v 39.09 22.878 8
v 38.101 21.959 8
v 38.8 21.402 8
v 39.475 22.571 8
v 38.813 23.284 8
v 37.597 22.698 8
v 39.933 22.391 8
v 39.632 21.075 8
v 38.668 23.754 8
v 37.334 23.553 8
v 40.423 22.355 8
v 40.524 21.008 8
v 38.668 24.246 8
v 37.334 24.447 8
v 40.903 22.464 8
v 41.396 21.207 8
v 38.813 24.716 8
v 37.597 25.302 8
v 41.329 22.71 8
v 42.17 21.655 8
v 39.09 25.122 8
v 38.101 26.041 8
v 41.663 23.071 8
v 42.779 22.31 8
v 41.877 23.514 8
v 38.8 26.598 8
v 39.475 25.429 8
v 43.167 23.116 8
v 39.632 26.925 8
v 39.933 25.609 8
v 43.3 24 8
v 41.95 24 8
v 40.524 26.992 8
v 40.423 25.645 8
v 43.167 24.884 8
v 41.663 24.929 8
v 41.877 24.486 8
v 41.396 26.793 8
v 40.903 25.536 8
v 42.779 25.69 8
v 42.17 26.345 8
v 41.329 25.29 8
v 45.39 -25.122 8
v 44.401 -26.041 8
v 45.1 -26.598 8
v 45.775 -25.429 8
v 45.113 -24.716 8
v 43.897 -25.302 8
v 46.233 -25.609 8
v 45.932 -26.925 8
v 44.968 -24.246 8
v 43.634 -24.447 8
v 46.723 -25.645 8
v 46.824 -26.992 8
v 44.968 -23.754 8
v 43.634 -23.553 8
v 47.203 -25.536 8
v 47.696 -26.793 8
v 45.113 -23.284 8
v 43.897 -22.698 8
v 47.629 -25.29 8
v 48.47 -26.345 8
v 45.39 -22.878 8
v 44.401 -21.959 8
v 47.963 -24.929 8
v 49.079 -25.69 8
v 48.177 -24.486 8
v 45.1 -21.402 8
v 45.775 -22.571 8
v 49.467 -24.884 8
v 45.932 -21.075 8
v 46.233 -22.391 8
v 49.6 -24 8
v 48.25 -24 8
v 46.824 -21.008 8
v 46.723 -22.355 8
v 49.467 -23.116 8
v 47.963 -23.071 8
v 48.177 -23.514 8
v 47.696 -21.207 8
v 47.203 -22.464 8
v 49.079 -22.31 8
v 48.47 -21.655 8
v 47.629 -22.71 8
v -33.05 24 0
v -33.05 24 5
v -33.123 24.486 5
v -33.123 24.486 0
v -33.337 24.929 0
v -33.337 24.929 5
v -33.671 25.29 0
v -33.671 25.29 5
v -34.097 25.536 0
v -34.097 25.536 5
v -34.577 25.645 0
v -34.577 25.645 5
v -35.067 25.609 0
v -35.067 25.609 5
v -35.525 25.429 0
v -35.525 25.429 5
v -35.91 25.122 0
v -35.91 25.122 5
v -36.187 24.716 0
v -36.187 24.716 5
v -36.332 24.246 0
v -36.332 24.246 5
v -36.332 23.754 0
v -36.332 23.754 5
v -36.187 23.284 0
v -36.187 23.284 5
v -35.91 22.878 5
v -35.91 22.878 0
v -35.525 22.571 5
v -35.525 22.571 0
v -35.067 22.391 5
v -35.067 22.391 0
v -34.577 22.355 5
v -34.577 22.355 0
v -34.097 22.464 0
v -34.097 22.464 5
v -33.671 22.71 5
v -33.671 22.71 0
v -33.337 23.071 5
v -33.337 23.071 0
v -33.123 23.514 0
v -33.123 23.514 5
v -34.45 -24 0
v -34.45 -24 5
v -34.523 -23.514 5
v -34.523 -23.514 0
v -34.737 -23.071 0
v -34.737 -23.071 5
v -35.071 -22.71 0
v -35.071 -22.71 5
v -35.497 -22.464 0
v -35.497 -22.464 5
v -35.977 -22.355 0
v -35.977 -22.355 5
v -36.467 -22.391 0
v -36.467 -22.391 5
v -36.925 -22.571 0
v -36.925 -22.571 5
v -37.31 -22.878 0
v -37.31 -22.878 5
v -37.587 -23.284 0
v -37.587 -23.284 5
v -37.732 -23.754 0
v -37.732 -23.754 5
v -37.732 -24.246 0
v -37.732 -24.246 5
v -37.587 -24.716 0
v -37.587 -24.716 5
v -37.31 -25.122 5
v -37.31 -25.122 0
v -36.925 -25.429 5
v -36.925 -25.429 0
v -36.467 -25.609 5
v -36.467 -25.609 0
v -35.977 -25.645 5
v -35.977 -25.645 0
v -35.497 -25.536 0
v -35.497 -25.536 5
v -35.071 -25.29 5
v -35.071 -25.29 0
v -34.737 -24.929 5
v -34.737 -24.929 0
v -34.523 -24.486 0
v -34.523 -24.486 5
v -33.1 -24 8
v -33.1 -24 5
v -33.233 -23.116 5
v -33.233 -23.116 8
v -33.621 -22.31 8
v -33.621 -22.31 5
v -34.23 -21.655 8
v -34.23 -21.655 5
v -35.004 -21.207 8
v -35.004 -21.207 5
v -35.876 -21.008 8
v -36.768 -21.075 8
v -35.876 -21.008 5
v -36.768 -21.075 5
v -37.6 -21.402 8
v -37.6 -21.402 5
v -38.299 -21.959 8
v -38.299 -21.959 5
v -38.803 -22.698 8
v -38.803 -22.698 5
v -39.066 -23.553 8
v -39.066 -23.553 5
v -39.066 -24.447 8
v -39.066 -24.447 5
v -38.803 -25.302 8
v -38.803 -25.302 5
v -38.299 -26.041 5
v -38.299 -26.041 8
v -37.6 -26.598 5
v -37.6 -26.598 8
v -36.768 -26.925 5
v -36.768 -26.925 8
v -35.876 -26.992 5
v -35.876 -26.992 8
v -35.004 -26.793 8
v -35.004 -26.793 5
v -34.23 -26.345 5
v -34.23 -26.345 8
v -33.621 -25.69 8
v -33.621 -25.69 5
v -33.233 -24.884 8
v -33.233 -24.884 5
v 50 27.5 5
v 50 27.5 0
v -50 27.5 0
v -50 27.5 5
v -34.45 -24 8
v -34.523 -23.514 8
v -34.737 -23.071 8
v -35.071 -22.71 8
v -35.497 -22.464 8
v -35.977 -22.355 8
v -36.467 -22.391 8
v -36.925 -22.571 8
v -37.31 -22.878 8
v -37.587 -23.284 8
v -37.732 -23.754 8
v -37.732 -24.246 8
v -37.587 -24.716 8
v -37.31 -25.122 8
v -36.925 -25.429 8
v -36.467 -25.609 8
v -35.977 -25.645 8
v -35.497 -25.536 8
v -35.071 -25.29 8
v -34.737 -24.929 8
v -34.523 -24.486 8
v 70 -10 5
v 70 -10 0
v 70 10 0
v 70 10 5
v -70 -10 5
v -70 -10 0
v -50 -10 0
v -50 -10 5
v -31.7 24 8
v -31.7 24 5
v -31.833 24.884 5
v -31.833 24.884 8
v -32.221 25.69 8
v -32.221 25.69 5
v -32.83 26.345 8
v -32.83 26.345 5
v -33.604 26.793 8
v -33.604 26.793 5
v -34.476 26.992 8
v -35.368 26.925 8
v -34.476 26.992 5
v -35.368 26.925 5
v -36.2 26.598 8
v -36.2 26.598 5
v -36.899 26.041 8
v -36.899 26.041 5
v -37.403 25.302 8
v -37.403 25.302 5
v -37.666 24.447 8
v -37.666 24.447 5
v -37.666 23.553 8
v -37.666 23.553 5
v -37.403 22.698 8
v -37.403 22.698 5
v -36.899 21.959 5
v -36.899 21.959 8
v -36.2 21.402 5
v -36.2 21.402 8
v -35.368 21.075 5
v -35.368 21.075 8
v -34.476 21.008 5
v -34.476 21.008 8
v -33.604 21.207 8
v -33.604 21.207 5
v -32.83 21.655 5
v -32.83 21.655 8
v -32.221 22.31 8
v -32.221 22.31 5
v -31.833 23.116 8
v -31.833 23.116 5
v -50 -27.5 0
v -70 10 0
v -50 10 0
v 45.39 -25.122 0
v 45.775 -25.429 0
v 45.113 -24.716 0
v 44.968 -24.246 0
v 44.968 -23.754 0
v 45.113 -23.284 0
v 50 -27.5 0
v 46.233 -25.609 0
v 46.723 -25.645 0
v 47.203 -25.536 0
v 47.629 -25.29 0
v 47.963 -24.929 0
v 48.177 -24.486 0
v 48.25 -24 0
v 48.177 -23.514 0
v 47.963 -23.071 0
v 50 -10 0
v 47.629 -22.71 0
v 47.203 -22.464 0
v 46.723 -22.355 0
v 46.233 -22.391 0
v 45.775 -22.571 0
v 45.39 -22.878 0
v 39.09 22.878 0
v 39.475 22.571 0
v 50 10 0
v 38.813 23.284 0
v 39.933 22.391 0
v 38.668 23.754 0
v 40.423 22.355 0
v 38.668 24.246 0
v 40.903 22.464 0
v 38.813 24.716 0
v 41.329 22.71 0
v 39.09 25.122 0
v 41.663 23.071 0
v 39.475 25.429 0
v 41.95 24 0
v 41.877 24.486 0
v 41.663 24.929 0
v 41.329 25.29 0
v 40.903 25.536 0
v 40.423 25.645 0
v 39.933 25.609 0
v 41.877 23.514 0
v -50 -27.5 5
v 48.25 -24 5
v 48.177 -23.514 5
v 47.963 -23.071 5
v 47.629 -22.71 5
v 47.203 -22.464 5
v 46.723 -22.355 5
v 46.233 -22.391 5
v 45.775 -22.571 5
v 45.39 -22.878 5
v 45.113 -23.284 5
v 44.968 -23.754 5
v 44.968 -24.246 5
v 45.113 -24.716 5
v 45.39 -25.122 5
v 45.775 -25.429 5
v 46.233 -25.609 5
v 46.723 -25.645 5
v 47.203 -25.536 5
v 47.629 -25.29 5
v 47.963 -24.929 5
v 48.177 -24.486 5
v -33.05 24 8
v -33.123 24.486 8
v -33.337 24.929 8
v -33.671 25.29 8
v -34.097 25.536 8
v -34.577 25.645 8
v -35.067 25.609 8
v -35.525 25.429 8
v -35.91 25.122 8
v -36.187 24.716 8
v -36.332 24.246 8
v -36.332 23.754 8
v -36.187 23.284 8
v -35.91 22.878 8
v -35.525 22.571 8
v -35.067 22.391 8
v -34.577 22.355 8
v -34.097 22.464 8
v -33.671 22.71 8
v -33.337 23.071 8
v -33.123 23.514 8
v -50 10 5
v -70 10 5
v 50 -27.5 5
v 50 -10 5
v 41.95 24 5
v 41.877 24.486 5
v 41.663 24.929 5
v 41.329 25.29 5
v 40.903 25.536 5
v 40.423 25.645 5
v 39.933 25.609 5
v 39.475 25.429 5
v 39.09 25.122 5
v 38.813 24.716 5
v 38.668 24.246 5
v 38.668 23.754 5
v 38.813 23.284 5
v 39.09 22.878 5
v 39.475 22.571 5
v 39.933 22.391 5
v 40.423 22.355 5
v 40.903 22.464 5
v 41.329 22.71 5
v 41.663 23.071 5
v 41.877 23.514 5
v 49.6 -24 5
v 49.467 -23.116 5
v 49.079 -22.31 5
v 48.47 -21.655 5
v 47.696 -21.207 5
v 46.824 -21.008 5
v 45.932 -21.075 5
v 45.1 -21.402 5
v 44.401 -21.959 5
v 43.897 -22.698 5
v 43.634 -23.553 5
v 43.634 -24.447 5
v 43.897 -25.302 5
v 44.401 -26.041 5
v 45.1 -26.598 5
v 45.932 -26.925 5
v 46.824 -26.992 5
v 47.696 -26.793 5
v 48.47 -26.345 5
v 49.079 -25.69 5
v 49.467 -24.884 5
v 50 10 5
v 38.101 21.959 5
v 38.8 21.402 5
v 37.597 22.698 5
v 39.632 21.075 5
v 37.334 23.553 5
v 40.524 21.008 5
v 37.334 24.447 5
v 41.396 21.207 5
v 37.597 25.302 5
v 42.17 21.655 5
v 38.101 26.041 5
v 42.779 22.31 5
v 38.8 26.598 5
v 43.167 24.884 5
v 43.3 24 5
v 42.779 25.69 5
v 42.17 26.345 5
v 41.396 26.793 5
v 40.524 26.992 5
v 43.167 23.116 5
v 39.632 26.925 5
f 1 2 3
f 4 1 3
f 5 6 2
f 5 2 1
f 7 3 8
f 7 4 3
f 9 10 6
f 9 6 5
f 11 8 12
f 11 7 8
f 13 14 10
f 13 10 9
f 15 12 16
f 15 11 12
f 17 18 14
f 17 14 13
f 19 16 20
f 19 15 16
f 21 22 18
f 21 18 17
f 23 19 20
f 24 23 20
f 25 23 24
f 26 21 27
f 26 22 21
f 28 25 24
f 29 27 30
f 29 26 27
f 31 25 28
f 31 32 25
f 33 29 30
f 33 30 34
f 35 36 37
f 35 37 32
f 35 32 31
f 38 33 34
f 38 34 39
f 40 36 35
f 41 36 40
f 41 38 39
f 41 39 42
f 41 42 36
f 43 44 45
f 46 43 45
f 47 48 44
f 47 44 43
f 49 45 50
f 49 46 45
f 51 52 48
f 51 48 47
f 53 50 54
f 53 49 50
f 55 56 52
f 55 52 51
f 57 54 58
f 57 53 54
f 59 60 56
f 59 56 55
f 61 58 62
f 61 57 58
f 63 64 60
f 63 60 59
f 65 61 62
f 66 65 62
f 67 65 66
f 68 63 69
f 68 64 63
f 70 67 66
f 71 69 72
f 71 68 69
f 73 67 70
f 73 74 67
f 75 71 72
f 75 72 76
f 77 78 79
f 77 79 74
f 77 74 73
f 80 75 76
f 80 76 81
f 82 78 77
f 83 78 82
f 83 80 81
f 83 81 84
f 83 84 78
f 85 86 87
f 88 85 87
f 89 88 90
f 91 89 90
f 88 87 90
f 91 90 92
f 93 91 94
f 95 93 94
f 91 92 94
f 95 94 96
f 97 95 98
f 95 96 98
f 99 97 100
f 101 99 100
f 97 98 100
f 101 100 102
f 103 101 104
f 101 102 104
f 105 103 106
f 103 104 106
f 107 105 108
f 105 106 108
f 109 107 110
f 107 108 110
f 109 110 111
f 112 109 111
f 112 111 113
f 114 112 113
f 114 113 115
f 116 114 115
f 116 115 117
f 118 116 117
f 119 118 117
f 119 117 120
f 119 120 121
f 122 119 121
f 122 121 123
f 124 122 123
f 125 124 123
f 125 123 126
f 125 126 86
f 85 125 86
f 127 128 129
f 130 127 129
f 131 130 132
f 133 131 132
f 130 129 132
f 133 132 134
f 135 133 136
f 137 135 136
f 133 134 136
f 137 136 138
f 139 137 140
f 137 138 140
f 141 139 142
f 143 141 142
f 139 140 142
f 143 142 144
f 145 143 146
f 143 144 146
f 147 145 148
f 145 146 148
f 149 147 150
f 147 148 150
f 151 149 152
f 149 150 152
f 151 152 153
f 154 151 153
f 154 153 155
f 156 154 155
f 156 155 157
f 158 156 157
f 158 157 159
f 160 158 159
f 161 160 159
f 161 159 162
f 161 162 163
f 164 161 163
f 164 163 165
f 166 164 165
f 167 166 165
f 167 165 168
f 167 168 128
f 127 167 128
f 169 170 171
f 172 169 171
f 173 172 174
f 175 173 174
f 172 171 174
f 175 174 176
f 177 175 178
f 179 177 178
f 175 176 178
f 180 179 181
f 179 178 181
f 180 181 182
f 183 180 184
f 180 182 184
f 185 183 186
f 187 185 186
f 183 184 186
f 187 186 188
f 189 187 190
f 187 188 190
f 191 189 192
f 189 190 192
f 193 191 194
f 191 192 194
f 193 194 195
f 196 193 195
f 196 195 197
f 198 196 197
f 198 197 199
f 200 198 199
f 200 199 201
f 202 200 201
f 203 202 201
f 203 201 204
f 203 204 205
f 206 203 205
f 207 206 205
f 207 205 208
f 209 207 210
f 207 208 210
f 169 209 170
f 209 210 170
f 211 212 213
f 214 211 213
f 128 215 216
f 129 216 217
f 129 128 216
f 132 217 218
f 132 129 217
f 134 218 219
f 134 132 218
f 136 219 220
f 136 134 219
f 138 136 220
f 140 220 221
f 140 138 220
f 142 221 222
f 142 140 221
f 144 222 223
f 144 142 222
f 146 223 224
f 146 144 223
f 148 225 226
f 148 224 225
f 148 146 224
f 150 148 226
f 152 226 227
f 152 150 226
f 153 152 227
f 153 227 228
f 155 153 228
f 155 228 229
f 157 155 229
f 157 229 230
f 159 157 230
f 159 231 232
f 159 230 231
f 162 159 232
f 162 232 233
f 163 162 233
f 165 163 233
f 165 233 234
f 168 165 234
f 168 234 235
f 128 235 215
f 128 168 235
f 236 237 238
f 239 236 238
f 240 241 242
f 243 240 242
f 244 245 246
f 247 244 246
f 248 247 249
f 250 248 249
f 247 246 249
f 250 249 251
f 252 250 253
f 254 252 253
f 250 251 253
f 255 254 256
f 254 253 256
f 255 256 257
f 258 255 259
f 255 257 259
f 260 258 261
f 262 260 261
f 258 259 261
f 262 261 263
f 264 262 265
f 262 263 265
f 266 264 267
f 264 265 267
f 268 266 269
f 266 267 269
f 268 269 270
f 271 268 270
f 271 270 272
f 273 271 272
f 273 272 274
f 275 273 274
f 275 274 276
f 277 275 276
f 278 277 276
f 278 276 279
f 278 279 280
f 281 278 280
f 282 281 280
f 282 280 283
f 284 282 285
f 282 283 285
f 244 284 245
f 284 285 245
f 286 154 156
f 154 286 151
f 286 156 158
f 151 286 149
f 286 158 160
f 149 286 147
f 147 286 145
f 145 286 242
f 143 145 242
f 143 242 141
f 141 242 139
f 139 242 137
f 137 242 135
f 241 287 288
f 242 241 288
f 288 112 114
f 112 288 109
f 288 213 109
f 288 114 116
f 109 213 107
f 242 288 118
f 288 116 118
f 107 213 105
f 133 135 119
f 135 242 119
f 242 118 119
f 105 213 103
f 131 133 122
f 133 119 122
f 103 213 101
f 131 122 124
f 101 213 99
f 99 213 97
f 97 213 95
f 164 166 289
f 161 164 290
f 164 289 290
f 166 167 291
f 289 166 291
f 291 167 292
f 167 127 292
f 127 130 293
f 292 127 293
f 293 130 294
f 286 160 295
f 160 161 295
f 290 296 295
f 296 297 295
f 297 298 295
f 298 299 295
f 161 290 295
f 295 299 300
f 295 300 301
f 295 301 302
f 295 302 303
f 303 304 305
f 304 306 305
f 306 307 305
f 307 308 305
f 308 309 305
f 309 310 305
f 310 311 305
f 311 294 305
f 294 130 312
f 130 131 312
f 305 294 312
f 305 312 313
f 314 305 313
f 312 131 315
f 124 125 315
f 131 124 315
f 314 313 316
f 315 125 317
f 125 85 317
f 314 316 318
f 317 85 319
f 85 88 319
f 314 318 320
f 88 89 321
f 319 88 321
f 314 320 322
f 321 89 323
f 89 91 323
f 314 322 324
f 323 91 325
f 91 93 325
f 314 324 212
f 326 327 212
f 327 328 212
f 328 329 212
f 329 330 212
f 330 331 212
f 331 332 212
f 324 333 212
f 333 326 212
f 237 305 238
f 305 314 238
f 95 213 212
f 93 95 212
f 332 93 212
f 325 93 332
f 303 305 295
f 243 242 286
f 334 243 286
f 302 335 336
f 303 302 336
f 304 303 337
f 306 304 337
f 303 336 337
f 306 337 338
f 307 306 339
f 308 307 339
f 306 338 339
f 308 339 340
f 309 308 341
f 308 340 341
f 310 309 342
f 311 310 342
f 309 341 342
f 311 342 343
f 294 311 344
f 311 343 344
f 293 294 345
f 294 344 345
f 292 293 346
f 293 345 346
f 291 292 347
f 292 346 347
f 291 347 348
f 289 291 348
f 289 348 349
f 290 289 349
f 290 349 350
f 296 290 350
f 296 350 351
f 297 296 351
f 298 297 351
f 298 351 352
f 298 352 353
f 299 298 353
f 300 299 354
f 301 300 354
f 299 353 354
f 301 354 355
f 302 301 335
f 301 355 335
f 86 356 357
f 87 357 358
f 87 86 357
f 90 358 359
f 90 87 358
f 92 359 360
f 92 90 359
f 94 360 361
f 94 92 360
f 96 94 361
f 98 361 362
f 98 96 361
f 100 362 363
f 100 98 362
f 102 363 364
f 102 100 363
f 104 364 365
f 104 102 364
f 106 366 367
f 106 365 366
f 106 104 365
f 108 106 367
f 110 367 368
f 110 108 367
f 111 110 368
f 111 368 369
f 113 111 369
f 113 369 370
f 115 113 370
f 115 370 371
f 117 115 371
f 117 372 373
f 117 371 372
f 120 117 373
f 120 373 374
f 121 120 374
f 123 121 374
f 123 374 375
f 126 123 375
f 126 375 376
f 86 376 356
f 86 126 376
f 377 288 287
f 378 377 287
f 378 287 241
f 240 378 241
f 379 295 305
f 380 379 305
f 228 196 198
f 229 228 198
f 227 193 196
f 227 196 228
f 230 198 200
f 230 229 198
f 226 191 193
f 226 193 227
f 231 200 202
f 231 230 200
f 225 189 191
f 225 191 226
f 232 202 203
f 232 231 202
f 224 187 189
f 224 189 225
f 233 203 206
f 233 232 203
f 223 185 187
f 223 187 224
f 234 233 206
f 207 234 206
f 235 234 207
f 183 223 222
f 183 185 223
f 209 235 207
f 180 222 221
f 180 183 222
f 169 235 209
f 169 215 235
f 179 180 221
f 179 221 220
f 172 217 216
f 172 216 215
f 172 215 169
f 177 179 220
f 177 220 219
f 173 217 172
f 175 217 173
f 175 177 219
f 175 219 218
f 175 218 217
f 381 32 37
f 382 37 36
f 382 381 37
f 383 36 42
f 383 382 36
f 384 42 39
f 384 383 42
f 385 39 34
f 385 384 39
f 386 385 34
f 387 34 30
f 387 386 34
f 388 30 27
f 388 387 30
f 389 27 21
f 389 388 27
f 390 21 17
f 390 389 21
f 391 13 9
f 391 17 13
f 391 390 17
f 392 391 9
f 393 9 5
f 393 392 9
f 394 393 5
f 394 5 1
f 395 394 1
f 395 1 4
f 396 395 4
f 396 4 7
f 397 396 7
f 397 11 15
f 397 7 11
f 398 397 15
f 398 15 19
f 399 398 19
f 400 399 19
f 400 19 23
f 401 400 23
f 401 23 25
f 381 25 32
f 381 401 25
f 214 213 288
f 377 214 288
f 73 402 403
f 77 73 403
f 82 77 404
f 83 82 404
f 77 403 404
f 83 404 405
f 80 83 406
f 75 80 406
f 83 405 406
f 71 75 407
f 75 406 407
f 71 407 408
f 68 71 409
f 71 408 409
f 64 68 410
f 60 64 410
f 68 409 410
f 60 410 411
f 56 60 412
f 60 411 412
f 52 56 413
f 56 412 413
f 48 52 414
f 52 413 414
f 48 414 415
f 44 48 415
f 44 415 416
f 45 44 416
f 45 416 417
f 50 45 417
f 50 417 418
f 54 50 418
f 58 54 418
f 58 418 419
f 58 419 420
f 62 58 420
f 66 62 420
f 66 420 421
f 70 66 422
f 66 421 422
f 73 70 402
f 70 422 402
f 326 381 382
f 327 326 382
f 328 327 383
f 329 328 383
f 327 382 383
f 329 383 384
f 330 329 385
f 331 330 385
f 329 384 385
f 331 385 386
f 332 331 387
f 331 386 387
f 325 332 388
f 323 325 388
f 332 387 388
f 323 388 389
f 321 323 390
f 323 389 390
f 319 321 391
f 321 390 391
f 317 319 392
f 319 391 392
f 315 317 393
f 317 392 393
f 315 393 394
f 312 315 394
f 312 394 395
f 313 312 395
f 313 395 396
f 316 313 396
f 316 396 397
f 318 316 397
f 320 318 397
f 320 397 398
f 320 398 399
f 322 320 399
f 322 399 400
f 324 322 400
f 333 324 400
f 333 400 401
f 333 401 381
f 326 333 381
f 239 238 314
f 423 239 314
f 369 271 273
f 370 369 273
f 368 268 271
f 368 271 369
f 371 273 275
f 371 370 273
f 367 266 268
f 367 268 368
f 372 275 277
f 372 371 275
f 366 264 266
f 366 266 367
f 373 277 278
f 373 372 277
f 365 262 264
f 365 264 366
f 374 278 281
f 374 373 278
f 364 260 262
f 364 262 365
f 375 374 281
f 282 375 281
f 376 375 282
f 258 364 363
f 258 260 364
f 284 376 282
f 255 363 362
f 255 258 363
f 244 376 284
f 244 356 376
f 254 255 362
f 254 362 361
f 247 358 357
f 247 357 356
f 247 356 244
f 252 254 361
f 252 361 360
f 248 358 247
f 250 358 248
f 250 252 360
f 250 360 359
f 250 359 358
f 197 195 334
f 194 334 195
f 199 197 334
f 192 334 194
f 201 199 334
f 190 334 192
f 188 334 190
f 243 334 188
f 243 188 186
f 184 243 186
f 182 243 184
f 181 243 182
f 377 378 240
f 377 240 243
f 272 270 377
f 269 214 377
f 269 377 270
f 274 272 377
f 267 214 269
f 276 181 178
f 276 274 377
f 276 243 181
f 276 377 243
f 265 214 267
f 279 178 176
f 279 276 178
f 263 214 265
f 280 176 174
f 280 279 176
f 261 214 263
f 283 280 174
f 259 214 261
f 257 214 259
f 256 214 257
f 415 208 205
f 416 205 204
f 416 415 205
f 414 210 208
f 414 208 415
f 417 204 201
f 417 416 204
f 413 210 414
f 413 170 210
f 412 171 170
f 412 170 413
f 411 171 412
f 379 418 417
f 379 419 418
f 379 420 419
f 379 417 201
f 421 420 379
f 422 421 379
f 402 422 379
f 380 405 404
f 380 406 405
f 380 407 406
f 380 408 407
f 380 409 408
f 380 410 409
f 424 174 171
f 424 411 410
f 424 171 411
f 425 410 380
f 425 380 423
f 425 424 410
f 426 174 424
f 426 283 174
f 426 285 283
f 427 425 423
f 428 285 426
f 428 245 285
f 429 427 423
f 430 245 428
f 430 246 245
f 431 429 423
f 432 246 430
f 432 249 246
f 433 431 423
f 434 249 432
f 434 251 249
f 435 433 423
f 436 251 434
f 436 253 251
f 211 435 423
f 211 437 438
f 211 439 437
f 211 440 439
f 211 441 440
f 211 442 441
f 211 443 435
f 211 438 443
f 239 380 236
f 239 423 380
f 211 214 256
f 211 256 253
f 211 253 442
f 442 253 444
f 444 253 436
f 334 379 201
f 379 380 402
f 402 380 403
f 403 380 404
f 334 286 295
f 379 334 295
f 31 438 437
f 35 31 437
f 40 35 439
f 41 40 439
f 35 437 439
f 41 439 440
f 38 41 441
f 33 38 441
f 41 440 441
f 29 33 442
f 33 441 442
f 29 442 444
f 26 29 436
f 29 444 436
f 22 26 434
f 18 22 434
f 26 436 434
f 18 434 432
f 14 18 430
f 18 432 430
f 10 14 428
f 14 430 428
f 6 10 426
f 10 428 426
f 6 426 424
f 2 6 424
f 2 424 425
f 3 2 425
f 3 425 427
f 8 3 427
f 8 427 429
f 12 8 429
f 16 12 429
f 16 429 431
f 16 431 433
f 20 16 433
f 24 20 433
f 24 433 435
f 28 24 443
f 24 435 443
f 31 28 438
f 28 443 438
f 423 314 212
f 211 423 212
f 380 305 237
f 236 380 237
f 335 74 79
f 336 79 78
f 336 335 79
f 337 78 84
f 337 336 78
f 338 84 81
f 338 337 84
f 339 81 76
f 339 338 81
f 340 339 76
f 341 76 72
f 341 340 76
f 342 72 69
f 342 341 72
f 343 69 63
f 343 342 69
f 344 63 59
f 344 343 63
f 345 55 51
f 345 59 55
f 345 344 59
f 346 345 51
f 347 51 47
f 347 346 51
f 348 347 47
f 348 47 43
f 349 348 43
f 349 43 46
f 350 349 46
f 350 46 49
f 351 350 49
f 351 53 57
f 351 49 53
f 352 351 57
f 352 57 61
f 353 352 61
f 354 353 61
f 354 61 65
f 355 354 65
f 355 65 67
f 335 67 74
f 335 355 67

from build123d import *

# Parameters (mm, degrees)
F1_DEPTH = 5
F2_R     = 1.65
F3_DEPTH = 18.8
F4_R     = 3
F5_DEPTH = 3
F6_DEPTH = 25


with BuildPart() as f1:
    # F0 (on Top) → F1 (new body)
    with BuildSketch(Plane.XY):
        Polygon((50, 10), (50, 27.5), (-50, 27.5), (-50, 10), (-70, 10), (-70, -10), (-50, -10), (-50, -27.5), (50, -27.5), (50, -10), (70, -10), (70, 10), align=None)
    extrude(amount=F1_DEPTH)

    # F2 (on face) → F3 (cut, symmetric)
    with BuildSketch(Plane.XY.offset(5)):
        with Locations((-34.7, 24)):
            Circle(F2_R)
        with Locations((40.3, 24)):
            Circle(F2_R)
        with Locations((-36.1, -24)):
            Circle(F2_R)
        with Locations((46.6, -24)):
            Circle(F2_R)
    extrude(amount=F3_DEPTH, both=True, mode=Mode.SUBTRACT)

    # F4 (on face) → F5 (join)
    with BuildSketch(Plane.XY.offset(5)):
        with Locations((-34.7, 24)):
            Circle(F4_R)
        with Locations((40.3, 24)):
            Circle(F4_R)
        with Locations((46.6, -24)):
            Circle(F4_R)
        with Locations((-36.1, -24)):
            Circle(F4_R)
    extrude(amount=F5_DEPTH)

    # F2 (on face) → F6 (cut)
    with BuildSketch(Plane.XY.offset(5)):
        with Locations((-34.7, 24)):
            Circle(F2_R)
        with Locations((40.3, 24)):
            Circle(F2_R)
        with Locations((-36.1, -24)):
            Circle(F2_R)
        with Locations((46.6, -24)):
            Circle(F2_R)
    extrude(amount=F6_DEPTH, mode=Mode.SUBTRACT)


solid = f1.part
